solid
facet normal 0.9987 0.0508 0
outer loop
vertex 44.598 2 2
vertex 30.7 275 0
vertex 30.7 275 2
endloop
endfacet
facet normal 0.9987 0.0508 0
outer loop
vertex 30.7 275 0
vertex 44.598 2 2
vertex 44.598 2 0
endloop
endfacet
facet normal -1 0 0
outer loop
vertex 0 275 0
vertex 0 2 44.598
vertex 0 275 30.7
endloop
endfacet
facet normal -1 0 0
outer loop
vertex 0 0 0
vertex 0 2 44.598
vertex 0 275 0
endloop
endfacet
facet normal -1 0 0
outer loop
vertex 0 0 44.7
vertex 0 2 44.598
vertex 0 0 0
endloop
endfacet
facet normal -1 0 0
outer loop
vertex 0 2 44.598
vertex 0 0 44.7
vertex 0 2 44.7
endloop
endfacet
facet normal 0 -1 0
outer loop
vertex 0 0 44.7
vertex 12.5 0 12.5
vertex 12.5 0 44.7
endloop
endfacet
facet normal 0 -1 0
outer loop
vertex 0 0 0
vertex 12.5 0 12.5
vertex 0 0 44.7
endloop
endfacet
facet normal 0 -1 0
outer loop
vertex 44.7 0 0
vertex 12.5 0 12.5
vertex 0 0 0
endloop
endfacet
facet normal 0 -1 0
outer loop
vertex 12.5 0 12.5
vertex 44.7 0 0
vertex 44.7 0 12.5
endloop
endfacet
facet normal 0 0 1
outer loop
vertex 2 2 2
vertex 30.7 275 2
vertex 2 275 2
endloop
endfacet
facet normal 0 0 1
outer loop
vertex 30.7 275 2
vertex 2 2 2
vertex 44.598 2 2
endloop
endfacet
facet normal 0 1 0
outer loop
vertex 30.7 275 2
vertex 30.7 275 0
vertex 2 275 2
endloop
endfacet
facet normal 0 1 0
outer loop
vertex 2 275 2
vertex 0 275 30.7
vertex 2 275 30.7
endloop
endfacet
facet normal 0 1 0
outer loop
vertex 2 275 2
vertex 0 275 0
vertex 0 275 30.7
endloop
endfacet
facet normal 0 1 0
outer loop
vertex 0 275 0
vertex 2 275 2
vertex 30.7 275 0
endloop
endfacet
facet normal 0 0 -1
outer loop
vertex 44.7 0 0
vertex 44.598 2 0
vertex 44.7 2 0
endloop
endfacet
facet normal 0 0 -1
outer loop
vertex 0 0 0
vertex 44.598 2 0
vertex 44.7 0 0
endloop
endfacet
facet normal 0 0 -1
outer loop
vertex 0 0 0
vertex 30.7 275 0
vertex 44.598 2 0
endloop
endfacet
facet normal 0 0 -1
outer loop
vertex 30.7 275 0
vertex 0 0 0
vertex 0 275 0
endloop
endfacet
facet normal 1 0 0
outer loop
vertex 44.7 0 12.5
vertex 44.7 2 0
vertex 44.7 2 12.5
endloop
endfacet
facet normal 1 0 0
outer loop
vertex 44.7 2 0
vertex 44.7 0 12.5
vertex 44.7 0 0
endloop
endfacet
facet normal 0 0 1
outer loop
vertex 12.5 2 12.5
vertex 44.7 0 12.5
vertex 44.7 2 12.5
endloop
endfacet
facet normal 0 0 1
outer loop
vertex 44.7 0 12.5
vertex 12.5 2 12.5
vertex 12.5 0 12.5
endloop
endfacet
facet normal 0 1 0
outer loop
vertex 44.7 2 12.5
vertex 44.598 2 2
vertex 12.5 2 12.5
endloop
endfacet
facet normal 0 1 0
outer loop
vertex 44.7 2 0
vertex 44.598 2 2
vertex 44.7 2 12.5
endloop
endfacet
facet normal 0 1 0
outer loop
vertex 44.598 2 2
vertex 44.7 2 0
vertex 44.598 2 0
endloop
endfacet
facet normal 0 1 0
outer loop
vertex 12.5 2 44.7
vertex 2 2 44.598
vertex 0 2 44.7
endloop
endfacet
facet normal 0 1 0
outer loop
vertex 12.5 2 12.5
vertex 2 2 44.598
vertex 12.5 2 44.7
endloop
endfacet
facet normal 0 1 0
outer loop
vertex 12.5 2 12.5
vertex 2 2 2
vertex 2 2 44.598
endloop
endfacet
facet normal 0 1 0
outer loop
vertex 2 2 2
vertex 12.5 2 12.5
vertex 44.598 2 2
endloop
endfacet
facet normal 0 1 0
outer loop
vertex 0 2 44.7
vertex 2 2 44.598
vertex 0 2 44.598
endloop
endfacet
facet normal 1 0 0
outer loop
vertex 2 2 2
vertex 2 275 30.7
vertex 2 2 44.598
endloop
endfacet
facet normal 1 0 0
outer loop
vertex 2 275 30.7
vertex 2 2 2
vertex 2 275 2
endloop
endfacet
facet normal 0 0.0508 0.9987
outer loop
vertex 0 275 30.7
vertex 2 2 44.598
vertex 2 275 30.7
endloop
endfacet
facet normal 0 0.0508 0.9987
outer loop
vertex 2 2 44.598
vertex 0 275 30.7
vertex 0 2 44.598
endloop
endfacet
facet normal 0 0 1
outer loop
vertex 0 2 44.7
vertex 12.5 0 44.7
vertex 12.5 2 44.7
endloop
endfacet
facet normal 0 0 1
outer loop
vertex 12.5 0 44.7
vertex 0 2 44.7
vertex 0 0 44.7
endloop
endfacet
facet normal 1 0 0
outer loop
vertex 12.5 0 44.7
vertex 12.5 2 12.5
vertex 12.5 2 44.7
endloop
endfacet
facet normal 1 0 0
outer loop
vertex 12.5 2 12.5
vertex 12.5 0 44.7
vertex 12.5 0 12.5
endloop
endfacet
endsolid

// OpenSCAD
module face() {
    linear_extrude(2)
        polygon(points=[[0,0],[44.7,0],[30.7,275],[0,275]]);
    cube([44.7, 2, 12.5], center = false);
}

face();
rotate([0,-90,0])
    mirror([0,0,1])
        face();
